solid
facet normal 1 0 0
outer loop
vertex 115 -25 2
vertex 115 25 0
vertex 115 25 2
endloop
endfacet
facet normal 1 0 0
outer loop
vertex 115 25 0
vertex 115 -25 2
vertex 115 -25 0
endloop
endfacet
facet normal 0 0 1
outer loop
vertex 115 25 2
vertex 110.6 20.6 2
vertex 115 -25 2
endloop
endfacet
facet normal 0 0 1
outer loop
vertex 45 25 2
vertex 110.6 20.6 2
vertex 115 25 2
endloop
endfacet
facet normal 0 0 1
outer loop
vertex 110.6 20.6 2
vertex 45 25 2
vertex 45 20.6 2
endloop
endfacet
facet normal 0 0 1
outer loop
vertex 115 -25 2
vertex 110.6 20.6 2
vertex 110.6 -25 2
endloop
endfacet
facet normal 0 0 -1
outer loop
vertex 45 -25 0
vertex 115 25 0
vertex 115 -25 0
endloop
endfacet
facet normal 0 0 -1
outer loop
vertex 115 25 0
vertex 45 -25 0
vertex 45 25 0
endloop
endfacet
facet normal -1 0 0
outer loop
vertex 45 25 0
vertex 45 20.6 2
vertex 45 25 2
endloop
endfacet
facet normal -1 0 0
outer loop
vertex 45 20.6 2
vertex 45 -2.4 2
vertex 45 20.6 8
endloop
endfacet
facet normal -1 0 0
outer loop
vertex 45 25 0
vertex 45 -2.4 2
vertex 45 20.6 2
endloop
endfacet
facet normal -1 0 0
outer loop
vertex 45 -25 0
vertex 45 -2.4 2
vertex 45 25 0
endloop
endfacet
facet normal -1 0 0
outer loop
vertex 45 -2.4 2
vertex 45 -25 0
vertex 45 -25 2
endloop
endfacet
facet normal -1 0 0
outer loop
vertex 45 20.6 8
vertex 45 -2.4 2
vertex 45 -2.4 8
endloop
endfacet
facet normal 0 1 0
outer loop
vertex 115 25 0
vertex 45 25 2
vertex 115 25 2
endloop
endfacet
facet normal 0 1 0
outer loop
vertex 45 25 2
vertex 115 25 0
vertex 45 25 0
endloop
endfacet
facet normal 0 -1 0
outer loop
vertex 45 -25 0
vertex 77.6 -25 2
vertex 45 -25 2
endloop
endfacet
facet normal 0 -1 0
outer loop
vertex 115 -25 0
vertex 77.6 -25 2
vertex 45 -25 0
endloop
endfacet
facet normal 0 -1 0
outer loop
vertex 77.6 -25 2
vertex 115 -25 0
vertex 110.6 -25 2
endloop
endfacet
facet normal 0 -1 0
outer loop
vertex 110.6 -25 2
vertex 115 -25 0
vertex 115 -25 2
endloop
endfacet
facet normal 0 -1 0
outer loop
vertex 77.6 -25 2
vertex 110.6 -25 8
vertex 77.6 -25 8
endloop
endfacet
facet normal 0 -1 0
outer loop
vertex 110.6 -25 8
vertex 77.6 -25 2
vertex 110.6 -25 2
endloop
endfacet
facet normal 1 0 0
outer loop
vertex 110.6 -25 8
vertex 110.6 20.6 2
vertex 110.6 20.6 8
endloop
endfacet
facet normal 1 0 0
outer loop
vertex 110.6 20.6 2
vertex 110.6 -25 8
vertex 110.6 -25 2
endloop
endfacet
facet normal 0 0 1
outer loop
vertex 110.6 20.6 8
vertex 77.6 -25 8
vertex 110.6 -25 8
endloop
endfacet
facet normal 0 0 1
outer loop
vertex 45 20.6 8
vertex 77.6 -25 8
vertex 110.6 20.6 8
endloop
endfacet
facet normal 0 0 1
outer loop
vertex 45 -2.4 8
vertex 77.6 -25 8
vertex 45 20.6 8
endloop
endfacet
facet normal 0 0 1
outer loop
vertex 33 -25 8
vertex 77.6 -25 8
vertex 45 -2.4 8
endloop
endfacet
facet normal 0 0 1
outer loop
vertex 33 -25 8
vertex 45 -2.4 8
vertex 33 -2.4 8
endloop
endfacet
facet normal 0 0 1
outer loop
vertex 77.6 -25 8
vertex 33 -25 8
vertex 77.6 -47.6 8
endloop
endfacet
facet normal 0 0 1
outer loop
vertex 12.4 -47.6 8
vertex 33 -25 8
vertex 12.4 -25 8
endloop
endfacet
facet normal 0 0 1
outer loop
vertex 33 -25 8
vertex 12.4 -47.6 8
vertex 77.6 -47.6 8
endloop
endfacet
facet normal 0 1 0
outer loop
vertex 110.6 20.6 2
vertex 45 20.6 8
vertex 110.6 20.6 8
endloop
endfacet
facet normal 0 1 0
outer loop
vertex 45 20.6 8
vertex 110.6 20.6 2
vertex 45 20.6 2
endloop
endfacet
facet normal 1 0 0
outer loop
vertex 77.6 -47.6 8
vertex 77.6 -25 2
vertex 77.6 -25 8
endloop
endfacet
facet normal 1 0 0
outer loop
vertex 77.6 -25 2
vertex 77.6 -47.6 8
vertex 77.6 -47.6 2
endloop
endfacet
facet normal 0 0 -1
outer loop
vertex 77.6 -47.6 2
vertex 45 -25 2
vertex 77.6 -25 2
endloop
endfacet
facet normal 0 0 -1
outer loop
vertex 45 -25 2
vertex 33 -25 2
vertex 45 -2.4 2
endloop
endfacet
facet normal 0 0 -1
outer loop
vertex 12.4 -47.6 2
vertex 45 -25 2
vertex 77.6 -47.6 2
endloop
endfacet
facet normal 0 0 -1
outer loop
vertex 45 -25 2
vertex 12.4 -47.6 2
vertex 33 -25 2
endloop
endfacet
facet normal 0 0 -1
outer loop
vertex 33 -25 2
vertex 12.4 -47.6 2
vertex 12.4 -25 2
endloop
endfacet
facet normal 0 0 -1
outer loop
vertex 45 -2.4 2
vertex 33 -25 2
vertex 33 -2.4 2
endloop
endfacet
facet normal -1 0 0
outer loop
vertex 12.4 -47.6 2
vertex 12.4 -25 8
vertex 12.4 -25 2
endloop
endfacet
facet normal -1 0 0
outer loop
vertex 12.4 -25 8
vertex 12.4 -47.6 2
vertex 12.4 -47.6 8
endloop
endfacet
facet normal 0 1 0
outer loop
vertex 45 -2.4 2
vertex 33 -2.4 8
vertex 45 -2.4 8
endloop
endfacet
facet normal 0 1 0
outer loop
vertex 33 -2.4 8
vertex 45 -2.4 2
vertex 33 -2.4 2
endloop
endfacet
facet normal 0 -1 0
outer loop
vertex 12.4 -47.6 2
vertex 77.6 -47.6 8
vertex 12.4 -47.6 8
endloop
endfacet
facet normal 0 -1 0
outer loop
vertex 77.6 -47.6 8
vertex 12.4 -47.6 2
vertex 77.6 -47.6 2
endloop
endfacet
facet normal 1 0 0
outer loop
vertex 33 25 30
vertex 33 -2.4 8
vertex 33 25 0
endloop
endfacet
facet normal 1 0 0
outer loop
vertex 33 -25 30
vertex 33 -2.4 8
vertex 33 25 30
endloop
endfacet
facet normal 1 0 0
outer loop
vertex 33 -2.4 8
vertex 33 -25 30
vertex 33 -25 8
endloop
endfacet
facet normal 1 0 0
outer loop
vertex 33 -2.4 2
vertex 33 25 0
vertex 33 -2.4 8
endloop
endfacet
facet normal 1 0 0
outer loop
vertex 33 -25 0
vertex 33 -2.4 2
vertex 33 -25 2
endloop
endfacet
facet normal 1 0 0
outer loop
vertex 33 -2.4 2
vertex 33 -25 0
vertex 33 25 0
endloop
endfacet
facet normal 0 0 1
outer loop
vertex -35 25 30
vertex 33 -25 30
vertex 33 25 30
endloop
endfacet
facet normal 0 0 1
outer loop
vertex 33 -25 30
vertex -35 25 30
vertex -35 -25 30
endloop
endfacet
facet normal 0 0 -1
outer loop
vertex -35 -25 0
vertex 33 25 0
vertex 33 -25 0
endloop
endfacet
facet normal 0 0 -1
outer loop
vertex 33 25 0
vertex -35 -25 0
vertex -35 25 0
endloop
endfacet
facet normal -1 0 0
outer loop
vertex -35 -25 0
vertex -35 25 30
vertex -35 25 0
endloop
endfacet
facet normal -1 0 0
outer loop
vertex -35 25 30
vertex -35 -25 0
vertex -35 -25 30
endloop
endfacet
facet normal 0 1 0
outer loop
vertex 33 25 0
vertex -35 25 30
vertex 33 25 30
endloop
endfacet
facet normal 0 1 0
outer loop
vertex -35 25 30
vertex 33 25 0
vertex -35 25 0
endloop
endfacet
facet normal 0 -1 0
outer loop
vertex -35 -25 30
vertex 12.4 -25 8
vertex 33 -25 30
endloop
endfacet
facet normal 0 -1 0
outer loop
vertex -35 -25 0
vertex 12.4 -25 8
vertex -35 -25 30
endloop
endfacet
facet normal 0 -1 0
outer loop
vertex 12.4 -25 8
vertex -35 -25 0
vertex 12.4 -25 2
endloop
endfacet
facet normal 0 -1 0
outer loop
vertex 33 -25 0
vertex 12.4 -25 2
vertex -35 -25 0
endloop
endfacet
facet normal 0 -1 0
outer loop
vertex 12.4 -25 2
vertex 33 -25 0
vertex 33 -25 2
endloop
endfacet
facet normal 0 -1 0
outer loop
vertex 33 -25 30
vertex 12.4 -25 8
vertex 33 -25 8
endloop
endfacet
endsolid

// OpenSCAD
// Two-part enclosure for a small electronics board (e.g. Arduino-based temperature logger)
// Print orientation: both parts rest on the bed (z = 0), build upward, side by side on the bed.
// The lid is printed upside down: a flat plate on the bed with a lip that drops into the box.

// ---------------- Parameters ----------------
box_x      = 70;    // box outer length (X)
box_y      = 50;    // box outer width (Y)
box_z      = 30;    // box outer height (Z)
box_wall   = 2;     // box wall thickness (sides and floor)
box_floor  = 2;     // box floor thickness (separate from side walls per the given dimensions)

lip_t      = 1.5;   // lip wall thickness
lip_h      = 4;     // lip height above the plate it crowns
lip_x      = 65.6;  // outer lip size in X
lip_y      = 45.6;  // outer lip size in Y
lip_clear  = 0.2;   // clearance between lip inner size and box opening (each side)

plate_t    = 2;     // lid plate thickness (lying flat on the bed)

gap        = 10;    // bed gap between the two parts

eps        = 0.5;   // cutter overshoot past faces

$fn = 64;

// ---------------- Derived ----------------
box_in_x   = box_x - 2 * box_wall;          // 66 mm
box_in_y   = box_y - 2 * box_wall;          // 46 mm
box_vol    = (box_x - box_wall) * box_y * box_z; // 10200 mm^3 (outer block minus top face)

lip_in_x   = lip_x - 2 * lip_clear;         // 65.2 mm
lip_in_y   = lip_y - 2 * lip_clear;         // 45.2 mm
lip_vol    = lip_x * lip_y * lip_t;         // 4483.2 mm^3

// ---------------- Model ----------------
union() {
    // Part 1: open-top box
    translate([-box_x / 2, -box_y / 2, 0])
        cube([box_x - box_wall, box_y, box_z]);   // outer block
    translate([-box_in_x / 2, -box_in_y / 2, box_floor])
        cube([box_in_x, box_in_y, box_z - box_floor]);  // open-top cavity
    // Remove a thin top face slab so the cavity has no coplanar face at the top
    translate([-box_in_x / 2, -box_in_y / 2, box_z - eps])
        cube([box_in_x, box_in_y, eps]);

    // Part 2: lid, printed upside down, on the +X side of the box
    translate([box_x / 2 + gap, -box_y / 2, 0])
        union() {
            // base plate lying flat on the bed
            cube([box_x, box_y, plate_t]);
            // lip: solid block up to the top of the lip, then cut the inner pocket
            translate([0, 0, plate_t])
                cube([lip_x, lip_y, plate_t + lip_h]);
            translate([-lip_in_x / 2, -lip_in_y / 2, plate_t])
                cube([lip_in_x, lip_in_y, plate_t + lip_h]);  // pocket from bed up to lip top
        }
}
